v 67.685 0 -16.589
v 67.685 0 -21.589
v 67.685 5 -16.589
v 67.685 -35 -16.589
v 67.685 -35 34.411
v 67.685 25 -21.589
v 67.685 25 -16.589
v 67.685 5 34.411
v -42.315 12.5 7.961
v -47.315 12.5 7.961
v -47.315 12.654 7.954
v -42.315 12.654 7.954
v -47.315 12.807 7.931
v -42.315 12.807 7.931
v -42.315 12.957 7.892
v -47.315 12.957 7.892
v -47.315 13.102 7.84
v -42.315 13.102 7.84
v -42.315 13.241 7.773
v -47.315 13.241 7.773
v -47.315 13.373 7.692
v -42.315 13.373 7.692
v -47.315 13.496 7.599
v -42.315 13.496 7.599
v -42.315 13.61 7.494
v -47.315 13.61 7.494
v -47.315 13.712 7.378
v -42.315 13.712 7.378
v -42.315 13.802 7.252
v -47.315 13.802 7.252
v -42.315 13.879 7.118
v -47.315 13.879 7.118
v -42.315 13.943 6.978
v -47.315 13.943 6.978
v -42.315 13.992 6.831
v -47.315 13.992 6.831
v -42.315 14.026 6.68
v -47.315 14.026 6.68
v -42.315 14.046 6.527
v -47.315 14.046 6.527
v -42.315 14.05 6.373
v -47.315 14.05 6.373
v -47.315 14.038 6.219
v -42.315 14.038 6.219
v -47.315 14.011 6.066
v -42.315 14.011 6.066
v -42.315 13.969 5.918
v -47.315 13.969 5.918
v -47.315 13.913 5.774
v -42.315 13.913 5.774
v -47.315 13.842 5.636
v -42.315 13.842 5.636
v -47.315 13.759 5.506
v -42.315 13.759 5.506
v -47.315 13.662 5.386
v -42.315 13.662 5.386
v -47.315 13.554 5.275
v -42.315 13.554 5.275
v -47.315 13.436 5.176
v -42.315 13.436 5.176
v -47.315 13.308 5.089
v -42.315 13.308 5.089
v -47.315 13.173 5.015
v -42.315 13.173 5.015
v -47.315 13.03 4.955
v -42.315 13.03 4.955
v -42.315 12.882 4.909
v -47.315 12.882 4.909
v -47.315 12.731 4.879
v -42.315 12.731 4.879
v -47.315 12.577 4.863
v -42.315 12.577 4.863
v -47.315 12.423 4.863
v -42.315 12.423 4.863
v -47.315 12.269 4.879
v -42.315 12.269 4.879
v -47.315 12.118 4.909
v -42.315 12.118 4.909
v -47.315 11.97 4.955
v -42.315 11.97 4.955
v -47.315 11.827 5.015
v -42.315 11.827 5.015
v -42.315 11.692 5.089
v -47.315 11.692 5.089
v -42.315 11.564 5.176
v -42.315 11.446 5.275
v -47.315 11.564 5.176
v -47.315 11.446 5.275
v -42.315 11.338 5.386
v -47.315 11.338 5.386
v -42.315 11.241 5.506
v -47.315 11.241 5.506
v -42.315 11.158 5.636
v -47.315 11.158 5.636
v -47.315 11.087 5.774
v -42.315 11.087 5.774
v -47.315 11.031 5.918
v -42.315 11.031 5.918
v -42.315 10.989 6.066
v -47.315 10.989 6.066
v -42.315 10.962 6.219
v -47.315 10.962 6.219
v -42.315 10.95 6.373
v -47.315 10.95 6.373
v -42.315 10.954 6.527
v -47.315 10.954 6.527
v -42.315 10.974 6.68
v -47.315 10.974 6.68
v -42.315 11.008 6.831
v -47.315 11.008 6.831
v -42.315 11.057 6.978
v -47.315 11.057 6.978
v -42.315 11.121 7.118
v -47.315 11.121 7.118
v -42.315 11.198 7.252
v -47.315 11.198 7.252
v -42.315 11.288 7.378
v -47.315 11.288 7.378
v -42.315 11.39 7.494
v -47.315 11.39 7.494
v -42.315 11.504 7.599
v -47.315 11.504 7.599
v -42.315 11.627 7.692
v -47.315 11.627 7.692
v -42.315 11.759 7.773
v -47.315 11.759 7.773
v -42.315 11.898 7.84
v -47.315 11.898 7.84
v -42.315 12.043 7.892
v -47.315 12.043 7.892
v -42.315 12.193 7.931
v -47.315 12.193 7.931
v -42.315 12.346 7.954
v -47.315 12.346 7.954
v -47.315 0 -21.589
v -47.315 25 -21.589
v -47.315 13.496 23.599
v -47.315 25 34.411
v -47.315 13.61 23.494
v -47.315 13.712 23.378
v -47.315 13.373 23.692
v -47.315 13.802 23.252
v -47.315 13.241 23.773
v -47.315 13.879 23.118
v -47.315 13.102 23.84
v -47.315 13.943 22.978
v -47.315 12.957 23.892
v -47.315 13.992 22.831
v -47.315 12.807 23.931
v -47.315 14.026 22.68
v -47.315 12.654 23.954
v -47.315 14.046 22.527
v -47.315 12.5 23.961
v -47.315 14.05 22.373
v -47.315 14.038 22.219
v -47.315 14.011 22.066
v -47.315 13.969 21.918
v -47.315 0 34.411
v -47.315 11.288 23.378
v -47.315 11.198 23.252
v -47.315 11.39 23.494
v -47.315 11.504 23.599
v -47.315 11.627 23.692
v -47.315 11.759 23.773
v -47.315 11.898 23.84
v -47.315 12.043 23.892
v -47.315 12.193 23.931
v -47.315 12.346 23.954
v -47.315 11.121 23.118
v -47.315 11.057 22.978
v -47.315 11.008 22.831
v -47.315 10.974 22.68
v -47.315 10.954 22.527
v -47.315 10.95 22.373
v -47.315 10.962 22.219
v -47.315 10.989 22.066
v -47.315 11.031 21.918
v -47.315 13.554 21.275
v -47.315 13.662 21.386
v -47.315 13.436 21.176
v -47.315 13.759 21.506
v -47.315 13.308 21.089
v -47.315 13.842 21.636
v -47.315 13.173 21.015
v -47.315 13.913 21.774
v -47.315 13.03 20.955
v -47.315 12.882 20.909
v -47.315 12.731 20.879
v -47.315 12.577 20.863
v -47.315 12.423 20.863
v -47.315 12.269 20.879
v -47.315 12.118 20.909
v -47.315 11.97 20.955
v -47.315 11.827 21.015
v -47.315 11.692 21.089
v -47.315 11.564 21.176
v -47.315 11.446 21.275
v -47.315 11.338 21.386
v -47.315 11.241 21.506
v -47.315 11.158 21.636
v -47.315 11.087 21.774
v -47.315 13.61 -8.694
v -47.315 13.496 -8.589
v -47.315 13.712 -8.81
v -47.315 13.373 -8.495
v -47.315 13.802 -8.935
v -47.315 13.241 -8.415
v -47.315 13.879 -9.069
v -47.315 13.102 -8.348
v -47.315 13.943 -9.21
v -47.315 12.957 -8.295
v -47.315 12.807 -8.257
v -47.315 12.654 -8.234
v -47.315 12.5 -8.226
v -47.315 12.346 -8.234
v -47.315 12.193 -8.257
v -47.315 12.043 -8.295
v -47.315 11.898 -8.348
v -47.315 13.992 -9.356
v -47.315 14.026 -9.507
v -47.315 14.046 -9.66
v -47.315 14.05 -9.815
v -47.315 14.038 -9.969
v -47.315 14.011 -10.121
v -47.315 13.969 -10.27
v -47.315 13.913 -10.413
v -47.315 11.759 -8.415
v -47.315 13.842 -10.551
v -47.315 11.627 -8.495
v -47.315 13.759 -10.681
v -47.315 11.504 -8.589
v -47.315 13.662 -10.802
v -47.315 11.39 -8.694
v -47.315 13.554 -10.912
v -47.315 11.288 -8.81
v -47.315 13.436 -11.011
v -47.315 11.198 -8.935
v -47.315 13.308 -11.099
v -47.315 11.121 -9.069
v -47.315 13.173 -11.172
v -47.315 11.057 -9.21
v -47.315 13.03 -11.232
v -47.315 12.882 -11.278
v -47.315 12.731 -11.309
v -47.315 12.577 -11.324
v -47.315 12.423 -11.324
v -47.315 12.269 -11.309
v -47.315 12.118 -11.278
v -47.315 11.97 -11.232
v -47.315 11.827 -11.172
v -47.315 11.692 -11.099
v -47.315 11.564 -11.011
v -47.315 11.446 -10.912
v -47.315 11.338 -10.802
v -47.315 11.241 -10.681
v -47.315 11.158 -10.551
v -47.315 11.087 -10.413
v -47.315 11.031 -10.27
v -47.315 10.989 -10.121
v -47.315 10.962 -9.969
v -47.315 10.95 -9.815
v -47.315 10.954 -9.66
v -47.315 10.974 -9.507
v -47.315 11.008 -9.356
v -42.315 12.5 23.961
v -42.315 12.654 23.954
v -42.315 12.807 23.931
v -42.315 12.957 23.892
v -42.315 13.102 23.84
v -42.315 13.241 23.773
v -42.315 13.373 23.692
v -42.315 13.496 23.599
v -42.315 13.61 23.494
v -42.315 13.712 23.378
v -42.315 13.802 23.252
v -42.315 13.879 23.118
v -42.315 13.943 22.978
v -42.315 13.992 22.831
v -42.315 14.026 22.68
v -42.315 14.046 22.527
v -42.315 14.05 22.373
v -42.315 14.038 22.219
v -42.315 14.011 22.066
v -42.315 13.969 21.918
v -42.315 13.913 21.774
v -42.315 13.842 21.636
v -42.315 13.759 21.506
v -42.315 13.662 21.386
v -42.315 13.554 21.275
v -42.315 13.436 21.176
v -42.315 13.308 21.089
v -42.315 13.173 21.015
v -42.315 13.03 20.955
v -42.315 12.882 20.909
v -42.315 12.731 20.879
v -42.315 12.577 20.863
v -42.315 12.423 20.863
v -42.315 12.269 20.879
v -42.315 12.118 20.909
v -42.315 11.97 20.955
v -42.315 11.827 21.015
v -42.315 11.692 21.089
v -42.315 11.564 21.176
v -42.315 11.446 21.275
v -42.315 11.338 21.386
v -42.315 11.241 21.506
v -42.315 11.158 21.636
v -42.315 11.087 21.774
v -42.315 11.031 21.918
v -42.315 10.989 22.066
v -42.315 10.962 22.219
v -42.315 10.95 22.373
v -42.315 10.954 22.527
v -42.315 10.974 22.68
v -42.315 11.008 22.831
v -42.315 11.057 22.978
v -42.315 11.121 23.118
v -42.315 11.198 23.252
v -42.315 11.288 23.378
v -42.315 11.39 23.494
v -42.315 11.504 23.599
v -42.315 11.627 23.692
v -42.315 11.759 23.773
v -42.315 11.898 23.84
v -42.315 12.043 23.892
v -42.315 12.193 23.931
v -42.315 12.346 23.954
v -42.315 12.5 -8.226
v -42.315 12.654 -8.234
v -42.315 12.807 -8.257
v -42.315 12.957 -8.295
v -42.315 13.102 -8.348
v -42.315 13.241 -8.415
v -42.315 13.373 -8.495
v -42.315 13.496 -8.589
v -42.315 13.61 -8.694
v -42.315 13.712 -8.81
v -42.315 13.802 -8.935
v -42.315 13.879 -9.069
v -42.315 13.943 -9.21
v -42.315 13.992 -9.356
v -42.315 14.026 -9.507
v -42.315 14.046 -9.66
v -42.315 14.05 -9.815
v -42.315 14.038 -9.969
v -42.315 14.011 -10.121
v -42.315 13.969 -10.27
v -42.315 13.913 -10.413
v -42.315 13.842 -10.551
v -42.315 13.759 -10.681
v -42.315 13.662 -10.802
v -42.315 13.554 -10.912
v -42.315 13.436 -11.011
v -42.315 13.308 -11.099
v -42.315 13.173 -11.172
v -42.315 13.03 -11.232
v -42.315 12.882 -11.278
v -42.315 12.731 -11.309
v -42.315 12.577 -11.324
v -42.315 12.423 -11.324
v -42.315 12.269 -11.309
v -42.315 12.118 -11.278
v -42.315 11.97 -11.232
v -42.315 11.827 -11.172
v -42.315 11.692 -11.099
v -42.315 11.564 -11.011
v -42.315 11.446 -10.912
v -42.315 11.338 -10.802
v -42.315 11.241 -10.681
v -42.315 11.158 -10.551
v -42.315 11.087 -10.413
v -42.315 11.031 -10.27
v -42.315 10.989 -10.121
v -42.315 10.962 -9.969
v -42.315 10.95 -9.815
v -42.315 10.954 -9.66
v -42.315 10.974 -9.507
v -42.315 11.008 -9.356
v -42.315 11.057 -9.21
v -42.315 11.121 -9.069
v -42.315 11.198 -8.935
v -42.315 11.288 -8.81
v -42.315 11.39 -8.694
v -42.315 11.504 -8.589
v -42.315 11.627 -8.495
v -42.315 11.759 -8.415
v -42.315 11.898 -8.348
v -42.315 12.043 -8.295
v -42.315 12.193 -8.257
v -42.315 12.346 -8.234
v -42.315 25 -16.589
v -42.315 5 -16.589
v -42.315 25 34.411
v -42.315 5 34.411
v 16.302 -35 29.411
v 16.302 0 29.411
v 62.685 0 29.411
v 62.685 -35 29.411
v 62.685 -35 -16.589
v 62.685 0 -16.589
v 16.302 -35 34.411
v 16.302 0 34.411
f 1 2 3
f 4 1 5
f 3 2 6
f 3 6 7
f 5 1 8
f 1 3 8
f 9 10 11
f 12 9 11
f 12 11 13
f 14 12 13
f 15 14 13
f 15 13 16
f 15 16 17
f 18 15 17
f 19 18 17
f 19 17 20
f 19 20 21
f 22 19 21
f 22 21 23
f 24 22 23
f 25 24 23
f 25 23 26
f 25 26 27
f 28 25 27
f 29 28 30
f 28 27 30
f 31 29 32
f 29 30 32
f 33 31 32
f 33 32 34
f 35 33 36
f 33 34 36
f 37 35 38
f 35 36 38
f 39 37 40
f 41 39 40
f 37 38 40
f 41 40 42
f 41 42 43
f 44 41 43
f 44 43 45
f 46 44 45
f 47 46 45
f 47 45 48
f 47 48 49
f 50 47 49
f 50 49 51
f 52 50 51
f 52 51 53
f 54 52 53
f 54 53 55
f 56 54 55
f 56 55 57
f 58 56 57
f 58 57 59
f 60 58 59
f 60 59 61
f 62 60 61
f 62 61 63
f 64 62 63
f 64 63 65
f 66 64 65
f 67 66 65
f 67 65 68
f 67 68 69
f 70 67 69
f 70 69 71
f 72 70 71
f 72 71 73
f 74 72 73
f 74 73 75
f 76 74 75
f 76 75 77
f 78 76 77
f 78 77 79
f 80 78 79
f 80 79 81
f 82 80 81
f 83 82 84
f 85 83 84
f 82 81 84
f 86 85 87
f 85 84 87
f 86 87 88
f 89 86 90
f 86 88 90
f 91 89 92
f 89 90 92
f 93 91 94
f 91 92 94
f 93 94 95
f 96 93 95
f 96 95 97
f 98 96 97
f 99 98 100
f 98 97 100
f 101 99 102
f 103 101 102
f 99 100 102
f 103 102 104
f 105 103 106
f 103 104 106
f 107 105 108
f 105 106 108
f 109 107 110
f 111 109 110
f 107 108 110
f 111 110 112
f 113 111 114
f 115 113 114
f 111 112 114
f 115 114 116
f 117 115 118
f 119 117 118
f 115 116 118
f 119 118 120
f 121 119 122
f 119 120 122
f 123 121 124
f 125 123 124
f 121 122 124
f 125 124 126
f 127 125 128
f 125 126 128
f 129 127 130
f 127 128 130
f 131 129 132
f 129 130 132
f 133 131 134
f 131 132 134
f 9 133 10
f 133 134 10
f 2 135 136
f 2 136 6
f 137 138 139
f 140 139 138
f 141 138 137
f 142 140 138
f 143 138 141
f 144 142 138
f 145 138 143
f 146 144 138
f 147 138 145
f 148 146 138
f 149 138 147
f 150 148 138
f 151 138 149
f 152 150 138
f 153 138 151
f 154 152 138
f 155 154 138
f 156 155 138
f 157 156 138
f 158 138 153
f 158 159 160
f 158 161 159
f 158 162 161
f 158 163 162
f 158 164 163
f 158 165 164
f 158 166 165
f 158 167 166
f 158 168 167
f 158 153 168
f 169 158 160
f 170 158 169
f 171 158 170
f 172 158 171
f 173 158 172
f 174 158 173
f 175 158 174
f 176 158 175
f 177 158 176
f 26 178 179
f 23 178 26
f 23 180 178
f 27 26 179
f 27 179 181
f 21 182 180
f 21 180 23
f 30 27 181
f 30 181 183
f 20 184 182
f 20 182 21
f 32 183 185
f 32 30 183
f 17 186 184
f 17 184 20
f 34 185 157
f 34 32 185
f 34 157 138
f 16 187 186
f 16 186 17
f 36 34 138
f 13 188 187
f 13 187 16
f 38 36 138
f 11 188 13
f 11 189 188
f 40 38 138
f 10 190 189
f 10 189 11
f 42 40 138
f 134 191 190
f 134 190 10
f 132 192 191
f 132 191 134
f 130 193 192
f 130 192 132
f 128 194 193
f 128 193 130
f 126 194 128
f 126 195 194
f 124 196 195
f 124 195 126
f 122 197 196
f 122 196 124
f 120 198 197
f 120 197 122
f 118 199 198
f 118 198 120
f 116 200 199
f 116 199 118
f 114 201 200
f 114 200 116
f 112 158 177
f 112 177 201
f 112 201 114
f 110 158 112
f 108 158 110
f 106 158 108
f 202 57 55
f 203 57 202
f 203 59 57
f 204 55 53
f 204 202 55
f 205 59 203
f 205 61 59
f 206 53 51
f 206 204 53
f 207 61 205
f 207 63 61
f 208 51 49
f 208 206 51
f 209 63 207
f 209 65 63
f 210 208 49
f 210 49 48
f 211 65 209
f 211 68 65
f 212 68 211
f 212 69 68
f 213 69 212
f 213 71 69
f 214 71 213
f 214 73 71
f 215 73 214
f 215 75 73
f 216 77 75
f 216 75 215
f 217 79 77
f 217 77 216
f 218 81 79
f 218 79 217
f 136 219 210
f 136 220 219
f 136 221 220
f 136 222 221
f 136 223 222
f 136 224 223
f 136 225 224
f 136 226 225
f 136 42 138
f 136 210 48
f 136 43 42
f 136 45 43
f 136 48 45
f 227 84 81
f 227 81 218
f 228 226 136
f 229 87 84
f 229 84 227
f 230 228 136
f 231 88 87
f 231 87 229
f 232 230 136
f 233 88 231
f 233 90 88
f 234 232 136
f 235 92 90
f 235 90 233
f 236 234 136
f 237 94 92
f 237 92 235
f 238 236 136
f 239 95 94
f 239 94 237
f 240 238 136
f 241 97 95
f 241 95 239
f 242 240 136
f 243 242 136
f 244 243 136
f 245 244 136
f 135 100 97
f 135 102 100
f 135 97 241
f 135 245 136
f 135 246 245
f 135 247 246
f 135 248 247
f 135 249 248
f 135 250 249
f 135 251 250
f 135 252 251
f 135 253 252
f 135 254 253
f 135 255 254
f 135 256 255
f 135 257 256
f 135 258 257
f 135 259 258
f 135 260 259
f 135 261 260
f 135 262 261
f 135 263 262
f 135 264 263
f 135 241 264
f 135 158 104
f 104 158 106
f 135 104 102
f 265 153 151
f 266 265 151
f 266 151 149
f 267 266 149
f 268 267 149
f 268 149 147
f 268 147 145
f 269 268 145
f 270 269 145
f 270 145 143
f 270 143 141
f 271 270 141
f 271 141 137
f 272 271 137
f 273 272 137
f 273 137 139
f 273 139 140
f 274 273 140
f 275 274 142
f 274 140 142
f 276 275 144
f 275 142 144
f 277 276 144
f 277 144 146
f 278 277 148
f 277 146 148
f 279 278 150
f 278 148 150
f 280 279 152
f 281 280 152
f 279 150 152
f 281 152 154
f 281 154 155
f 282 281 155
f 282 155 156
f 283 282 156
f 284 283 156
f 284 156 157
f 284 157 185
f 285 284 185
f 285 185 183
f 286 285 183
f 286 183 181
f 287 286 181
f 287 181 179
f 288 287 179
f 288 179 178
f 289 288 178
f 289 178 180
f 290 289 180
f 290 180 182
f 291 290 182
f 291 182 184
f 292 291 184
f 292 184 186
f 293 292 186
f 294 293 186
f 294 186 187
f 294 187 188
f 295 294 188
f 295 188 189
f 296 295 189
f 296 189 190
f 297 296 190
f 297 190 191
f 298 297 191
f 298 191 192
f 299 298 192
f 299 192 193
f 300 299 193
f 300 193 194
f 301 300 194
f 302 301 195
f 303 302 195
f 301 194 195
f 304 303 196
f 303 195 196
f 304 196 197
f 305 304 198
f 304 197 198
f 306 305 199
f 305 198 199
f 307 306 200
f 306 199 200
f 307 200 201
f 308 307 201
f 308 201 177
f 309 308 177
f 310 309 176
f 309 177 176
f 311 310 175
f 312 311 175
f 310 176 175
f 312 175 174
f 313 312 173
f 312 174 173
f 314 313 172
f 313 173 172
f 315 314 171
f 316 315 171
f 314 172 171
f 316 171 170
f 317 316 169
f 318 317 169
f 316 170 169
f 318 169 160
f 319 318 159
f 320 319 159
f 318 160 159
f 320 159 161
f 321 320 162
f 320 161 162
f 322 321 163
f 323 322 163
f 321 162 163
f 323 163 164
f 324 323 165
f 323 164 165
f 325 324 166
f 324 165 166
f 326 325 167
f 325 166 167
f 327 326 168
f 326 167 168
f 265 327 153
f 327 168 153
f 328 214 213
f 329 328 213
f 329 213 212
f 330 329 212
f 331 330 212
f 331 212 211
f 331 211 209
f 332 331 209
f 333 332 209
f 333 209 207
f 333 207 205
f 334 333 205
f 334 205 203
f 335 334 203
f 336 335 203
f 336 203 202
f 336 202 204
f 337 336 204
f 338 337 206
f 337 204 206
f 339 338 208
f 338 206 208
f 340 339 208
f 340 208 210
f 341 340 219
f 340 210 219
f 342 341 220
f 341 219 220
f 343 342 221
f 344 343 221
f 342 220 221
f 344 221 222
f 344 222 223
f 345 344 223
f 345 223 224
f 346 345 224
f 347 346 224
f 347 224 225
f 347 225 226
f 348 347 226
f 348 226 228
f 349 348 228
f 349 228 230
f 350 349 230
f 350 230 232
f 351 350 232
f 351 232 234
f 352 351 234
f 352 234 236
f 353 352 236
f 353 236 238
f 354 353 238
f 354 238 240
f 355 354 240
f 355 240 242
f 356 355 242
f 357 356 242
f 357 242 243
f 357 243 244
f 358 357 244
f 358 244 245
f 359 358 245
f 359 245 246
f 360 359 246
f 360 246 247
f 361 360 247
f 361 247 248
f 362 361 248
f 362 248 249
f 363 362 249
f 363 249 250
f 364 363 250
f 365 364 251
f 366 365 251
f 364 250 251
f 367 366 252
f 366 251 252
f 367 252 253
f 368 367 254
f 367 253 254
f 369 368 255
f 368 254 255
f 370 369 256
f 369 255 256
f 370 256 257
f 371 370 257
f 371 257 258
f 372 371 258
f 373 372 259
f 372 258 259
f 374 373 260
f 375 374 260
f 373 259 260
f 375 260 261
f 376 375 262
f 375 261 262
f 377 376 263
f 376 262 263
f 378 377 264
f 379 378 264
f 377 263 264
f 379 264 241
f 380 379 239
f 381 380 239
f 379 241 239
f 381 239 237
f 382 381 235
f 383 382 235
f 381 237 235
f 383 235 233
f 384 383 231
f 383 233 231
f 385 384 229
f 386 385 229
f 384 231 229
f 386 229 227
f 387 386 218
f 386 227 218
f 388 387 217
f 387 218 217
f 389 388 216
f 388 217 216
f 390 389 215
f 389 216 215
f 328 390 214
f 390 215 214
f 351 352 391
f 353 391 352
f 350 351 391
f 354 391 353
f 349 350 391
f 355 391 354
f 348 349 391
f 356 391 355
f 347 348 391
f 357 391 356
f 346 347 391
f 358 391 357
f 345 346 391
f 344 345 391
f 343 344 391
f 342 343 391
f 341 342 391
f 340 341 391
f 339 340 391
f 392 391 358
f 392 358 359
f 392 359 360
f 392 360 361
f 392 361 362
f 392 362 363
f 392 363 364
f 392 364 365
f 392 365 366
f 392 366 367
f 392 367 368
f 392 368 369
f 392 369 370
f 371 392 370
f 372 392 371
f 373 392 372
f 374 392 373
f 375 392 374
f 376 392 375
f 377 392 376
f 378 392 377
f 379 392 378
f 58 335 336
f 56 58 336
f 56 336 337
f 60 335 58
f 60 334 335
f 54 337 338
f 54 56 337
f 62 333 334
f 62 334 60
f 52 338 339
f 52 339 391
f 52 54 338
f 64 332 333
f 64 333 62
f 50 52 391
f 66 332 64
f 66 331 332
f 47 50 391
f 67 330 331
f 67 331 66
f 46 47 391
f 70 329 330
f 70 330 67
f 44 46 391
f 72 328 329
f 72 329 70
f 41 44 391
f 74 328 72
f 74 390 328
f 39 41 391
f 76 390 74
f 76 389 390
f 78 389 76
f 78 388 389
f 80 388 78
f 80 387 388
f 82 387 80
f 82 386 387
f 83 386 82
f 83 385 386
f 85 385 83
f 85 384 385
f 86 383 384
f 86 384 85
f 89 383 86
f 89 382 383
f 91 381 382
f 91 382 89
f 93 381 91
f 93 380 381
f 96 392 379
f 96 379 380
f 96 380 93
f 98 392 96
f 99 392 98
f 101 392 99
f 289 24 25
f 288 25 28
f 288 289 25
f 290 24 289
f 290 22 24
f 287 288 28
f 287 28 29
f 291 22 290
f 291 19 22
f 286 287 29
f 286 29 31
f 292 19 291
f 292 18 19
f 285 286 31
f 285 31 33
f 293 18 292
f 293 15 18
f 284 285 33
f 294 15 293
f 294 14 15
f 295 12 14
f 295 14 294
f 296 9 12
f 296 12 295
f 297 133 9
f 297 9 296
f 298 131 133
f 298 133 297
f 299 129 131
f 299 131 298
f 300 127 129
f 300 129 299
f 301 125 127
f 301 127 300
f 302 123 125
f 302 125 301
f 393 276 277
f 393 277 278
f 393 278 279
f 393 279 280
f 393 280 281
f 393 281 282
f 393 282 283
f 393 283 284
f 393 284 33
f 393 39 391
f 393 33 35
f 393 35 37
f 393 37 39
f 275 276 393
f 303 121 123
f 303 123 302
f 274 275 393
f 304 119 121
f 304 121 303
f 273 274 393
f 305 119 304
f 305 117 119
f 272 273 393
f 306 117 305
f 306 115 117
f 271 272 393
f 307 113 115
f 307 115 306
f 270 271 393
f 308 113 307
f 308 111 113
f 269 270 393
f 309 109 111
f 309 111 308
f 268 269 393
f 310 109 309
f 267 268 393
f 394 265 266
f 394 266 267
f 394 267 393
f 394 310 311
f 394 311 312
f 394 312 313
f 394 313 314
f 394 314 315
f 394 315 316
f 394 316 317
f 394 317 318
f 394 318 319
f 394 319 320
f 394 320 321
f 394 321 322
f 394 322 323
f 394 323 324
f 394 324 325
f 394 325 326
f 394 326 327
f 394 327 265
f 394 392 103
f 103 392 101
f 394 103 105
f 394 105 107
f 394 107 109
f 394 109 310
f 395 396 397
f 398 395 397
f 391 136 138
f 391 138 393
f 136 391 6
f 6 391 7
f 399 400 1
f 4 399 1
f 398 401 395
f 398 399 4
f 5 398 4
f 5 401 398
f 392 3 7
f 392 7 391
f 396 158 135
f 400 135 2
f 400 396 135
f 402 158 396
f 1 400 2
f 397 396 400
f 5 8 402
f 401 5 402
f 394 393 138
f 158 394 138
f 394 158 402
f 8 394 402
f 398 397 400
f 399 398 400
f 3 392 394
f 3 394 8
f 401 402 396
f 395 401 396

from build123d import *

# Parameters (mm, degrees)
SKETCH_1_W          = 110
SKETCH_1_H          = 51
EXTRUDE_1_DEPTH     = 5
EXTRUDE_2_DEPTH     = 25
SKETCH_3_R          = 1.55
CUT_EXTRUDE_1_DEPTH = 123.613771256
EXTRUDE_3_DEPTH     = 35


with BuildPart() as part:
    # 草图1 → 凸台-拉伸1 (new body)
    with BuildSketch(Plane(origin=(0, 0, 0), x_dir=(1, 0, 0), z_dir=(0, 1, 0))):
        with Locations((12.685483871, -8.911290323)):
            Rectangle(SKETCH_1_W, SKETCH_1_H)
    extrude(amount=EXTRUDE_1_DEPTH)



with BuildPart() as body_2:
    # 草图2 → 凸台-拉伸2 (new body)
    with BuildSketch(Plane.XZ):
        Polygon((-42.314516129, 34.411290323), (-47.314516129, 34.411290323), (-47.314516129, -16.588709677), (-47.314516129, -21.588709677), (67.685483871, -21.588709677), (67.685483871, -16.588709677), (-42.314516129, -16.588709677), align=None)
    extrude(amount=-EXTRUDE_2_DEPTH)

    # 草图3 → 切除-拉伸1 (cut, through all)
    with BuildSketch(Plane.ZY.offset(47.314516129)):
        with Locations((-9.775923567, 12.5)):
            Circle(SKETCH_3_R)
        with Locations((6.411290323, 12.5)):
            Circle(SKETCH_3_R)
        with Locations((22.411290323, 12.5)):
            Circle(SKETCH_3_R)
    extrude(amount=-CUT_EXTRUDE_1_DEPTH, mode=Mode.SUBTRACT)


with BuildPart() as part_1:
    add(part.part)

    add(body_2.part)  # 凸台-拉伸3 merges body 2
    # 草图4 → 凸台-拉伸3 (add)
    with BuildSketch(Plane.XZ):
        Polygon((67.685483871, 29.411290323), (67.685483871, 34.411290323), (62.685483871, 34.411290323), (16.301510032, 34.411290323), (16.301510032, 29.411290323), (62.685483871, 29.411290323), (62.685483871, -16.588709677), (67.685483871, -16.588709677), align=None)
    extrude(amount=EXTRUDE_3_DEPTH)


solid = part_1.part
